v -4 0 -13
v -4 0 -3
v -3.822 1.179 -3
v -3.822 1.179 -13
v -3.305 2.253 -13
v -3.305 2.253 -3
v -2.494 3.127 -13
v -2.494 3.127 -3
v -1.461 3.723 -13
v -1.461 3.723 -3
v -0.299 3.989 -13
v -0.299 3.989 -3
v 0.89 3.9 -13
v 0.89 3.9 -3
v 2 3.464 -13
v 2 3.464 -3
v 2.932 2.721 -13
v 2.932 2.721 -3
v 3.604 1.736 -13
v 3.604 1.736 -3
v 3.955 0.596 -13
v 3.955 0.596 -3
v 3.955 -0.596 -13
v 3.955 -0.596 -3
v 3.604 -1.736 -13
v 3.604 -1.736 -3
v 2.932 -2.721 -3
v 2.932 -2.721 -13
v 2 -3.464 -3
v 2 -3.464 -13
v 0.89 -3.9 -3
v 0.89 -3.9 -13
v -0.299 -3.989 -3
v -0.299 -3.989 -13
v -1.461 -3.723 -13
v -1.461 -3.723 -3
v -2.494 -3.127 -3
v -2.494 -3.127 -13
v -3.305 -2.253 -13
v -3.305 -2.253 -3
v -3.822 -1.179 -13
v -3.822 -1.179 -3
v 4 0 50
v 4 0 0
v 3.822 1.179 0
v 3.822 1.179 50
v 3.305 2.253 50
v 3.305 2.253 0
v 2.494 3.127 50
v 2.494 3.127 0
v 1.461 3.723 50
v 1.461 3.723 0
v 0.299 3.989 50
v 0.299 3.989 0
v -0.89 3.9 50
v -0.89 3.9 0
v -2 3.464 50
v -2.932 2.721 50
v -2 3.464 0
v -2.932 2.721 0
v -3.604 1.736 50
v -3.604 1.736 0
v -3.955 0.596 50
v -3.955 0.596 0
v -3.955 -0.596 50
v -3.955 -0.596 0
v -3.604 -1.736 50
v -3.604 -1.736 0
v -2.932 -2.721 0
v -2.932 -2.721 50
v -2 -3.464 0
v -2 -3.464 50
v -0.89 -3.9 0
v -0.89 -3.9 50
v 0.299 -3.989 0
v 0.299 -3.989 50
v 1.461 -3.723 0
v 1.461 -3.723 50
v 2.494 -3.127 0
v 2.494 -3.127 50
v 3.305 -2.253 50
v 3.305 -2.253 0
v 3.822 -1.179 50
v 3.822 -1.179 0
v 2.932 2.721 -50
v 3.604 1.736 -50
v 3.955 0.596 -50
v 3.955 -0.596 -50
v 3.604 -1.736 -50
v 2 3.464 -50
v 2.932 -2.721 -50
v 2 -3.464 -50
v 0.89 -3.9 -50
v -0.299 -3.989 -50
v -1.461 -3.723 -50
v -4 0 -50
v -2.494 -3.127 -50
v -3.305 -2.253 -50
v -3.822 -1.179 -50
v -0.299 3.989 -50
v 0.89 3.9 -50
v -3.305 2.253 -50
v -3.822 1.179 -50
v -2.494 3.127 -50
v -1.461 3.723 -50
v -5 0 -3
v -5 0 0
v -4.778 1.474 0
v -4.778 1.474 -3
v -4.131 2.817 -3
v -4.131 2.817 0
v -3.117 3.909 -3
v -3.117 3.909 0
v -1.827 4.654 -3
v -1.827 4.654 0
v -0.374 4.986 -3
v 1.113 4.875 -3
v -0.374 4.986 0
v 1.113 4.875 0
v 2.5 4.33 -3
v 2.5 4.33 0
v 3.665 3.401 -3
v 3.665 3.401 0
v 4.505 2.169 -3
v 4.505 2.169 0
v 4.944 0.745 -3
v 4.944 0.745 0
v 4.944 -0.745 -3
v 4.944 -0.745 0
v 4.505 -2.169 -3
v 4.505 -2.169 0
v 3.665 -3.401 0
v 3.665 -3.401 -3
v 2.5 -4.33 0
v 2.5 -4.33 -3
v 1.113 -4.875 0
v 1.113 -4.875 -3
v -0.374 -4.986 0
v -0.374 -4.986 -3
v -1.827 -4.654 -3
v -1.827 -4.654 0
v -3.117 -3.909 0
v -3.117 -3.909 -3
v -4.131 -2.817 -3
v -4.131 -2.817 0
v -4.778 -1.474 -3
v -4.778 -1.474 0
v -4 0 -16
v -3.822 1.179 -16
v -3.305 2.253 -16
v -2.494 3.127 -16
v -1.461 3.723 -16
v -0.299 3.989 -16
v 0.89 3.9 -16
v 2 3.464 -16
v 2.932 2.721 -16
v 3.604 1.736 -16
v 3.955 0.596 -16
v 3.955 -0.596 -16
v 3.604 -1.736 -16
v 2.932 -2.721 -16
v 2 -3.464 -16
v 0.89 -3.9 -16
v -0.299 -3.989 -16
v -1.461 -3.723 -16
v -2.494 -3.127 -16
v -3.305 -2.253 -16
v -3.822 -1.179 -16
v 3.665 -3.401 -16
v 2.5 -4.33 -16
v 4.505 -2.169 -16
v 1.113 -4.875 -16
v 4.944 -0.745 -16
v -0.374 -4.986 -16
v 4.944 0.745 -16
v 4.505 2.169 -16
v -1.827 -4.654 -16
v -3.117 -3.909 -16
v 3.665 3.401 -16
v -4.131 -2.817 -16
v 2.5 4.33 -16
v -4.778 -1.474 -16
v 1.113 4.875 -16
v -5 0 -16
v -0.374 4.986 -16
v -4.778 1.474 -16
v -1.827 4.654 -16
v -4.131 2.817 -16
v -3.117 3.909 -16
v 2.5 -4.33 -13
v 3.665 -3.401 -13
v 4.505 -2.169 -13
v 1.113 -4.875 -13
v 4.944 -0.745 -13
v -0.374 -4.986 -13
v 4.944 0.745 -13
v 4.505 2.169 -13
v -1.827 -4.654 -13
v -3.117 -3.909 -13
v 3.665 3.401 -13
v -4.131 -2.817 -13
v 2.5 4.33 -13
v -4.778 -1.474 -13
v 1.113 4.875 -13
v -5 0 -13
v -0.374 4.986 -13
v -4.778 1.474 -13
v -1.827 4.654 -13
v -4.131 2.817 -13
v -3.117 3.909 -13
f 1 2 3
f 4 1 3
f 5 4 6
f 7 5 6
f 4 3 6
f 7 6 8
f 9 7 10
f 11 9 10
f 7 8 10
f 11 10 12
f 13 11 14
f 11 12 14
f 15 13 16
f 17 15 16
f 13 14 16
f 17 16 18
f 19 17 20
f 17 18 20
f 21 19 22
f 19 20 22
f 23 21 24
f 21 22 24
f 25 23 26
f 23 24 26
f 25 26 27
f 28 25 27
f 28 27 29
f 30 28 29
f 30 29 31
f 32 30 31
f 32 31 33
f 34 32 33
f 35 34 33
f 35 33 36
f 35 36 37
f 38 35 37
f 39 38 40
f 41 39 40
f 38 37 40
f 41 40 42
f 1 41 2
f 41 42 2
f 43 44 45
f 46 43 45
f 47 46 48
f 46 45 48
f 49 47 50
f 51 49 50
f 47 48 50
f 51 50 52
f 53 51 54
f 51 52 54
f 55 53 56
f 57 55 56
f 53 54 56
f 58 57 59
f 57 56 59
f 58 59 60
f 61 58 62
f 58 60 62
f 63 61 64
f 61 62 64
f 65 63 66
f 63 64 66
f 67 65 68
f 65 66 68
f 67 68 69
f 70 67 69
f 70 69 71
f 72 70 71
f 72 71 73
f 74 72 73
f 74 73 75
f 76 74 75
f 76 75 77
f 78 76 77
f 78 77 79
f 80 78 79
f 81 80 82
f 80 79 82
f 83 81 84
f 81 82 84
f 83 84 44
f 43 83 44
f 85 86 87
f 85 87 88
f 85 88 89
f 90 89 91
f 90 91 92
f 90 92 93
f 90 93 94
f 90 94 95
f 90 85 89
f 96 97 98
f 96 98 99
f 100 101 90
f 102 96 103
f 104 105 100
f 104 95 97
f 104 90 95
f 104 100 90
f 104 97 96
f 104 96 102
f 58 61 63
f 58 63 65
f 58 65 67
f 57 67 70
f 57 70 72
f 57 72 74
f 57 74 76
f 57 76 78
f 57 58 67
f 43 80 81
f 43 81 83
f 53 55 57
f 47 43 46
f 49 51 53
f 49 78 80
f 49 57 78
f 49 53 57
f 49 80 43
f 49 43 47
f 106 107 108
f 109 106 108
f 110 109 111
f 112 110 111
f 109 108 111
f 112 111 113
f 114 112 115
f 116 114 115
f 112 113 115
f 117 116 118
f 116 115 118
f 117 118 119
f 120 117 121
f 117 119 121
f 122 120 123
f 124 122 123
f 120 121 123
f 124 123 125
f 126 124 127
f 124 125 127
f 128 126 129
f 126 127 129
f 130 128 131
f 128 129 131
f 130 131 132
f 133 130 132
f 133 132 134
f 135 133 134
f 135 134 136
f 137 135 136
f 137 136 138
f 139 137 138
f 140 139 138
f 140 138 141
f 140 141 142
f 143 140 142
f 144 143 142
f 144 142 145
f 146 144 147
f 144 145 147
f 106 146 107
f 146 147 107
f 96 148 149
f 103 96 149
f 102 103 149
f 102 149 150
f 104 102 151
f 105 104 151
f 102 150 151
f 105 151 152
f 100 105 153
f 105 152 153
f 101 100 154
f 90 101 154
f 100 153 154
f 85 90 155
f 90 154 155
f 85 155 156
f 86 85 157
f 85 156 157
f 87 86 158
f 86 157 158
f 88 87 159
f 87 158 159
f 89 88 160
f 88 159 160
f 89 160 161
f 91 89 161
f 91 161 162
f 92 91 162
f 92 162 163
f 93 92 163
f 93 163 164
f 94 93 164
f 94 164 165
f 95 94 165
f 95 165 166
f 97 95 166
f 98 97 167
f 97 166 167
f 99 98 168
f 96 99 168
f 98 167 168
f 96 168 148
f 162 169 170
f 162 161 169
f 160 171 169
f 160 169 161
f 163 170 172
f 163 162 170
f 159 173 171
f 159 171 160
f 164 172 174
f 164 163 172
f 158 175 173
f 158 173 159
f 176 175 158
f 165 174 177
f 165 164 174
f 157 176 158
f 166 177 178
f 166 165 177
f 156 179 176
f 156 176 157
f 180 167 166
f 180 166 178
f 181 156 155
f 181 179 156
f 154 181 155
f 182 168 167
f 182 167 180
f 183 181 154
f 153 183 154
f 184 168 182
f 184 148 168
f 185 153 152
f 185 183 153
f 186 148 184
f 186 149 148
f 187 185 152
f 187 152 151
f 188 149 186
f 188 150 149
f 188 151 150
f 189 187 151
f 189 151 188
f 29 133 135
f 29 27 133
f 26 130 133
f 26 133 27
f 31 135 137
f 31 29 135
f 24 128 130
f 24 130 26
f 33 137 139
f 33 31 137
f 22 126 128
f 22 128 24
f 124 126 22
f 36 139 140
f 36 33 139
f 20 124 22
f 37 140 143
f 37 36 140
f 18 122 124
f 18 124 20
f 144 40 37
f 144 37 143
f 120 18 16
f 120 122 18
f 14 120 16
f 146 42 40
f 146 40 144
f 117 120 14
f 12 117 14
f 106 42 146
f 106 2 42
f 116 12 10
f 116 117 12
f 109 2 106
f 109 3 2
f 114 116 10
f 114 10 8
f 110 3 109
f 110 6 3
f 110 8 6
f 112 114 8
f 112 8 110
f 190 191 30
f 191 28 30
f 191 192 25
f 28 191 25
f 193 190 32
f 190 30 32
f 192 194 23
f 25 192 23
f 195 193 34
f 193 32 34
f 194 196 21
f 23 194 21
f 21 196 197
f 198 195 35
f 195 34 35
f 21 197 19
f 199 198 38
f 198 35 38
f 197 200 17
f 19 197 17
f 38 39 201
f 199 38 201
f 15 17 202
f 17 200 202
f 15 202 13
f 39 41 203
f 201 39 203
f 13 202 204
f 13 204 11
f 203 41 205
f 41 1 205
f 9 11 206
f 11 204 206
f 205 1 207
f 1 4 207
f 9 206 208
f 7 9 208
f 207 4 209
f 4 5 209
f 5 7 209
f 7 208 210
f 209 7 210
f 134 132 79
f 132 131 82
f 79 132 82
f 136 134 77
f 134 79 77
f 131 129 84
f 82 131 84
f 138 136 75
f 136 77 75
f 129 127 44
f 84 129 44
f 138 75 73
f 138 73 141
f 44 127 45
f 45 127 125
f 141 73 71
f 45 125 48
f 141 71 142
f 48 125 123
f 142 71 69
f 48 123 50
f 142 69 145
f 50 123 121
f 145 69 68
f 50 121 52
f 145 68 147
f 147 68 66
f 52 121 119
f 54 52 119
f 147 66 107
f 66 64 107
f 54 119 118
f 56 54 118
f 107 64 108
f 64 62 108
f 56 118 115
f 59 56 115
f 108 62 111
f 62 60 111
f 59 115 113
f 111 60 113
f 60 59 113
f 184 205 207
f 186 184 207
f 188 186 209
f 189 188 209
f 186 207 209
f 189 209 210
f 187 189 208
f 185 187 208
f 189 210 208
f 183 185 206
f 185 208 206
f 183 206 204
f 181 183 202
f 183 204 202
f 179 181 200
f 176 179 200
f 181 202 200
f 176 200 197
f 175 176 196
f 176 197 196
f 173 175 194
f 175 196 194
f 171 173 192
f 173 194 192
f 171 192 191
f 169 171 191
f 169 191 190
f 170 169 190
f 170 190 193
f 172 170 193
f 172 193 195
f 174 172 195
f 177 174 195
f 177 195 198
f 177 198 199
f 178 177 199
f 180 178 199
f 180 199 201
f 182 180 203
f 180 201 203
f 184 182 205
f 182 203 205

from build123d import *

# Parameters (mm, degrees)
SKETCH1_R           = 4
BOSS_EXTRUDE1_DEPTH = 50
SKETCH2_R           = 5
BOSS_EXTRUDE2_DEPTH = 3
SKETCH3_R           = 4
BOSS_EXTRUDE3_DEPTH = 10
SKETCH4_R           = 5
BOSS_EXTRUDE4_DEPTH = 3
SKETCH5_R           = 4
BOSS_EXTRUDE5_DEPTH = 34


with BuildPart() as part:
    # Sketch1 → Boss-Extrude1 (new body)
    with BuildSketch(Plane.XY):
        Circle(SKETCH1_R)
    extrude(amount=BOSS_EXTRUDE1_DEPTH)

    # Sketch2 → Boss-Extrude2 (add)
    with BuildSketch(Plane(origin=(0, 0, 0), x_dir=(-1, 0, 0), z_dir=(0, 0, -1))):
        Circle(SKETCH2_R)
    extrude(amount=BOSS_EXTRUDE2_DEPTH)

    # Sketch3 → Boss-Extrude3 (add)
    with BuildSketch(Plane(origin=(0, 0, -3), x_dir=(-1, 0, 0), z_dir=(0, 0, -1))):
        Circle(SKETCH3_R)
    extrude(amount=BOSS_EXTRUDE3_DEPTH)

    # Sketch4 → Boss-Extrude4 (add)
    with BuildSketch(Plane(origin=(0, 0, -13), x_dir=(-1, 0, 0), z_dir=(0, 0, -1))):
        Circle(SKETCH4_R)
    extrude(amount=BOSS_EXTRUDE4_DEPTH)

    # Sketch5 → Boss-Extrude5 (add)
    with BuildSketch(Plane(origin=(0, 0, -16), x_dir=(-1, 0, 0), z_dir=(0, 0, -1))):
        Circle(SKETCH5_R)
    extrude(amount=BOSS_EXTRUDE5_DEPTH)


solid = part.part
